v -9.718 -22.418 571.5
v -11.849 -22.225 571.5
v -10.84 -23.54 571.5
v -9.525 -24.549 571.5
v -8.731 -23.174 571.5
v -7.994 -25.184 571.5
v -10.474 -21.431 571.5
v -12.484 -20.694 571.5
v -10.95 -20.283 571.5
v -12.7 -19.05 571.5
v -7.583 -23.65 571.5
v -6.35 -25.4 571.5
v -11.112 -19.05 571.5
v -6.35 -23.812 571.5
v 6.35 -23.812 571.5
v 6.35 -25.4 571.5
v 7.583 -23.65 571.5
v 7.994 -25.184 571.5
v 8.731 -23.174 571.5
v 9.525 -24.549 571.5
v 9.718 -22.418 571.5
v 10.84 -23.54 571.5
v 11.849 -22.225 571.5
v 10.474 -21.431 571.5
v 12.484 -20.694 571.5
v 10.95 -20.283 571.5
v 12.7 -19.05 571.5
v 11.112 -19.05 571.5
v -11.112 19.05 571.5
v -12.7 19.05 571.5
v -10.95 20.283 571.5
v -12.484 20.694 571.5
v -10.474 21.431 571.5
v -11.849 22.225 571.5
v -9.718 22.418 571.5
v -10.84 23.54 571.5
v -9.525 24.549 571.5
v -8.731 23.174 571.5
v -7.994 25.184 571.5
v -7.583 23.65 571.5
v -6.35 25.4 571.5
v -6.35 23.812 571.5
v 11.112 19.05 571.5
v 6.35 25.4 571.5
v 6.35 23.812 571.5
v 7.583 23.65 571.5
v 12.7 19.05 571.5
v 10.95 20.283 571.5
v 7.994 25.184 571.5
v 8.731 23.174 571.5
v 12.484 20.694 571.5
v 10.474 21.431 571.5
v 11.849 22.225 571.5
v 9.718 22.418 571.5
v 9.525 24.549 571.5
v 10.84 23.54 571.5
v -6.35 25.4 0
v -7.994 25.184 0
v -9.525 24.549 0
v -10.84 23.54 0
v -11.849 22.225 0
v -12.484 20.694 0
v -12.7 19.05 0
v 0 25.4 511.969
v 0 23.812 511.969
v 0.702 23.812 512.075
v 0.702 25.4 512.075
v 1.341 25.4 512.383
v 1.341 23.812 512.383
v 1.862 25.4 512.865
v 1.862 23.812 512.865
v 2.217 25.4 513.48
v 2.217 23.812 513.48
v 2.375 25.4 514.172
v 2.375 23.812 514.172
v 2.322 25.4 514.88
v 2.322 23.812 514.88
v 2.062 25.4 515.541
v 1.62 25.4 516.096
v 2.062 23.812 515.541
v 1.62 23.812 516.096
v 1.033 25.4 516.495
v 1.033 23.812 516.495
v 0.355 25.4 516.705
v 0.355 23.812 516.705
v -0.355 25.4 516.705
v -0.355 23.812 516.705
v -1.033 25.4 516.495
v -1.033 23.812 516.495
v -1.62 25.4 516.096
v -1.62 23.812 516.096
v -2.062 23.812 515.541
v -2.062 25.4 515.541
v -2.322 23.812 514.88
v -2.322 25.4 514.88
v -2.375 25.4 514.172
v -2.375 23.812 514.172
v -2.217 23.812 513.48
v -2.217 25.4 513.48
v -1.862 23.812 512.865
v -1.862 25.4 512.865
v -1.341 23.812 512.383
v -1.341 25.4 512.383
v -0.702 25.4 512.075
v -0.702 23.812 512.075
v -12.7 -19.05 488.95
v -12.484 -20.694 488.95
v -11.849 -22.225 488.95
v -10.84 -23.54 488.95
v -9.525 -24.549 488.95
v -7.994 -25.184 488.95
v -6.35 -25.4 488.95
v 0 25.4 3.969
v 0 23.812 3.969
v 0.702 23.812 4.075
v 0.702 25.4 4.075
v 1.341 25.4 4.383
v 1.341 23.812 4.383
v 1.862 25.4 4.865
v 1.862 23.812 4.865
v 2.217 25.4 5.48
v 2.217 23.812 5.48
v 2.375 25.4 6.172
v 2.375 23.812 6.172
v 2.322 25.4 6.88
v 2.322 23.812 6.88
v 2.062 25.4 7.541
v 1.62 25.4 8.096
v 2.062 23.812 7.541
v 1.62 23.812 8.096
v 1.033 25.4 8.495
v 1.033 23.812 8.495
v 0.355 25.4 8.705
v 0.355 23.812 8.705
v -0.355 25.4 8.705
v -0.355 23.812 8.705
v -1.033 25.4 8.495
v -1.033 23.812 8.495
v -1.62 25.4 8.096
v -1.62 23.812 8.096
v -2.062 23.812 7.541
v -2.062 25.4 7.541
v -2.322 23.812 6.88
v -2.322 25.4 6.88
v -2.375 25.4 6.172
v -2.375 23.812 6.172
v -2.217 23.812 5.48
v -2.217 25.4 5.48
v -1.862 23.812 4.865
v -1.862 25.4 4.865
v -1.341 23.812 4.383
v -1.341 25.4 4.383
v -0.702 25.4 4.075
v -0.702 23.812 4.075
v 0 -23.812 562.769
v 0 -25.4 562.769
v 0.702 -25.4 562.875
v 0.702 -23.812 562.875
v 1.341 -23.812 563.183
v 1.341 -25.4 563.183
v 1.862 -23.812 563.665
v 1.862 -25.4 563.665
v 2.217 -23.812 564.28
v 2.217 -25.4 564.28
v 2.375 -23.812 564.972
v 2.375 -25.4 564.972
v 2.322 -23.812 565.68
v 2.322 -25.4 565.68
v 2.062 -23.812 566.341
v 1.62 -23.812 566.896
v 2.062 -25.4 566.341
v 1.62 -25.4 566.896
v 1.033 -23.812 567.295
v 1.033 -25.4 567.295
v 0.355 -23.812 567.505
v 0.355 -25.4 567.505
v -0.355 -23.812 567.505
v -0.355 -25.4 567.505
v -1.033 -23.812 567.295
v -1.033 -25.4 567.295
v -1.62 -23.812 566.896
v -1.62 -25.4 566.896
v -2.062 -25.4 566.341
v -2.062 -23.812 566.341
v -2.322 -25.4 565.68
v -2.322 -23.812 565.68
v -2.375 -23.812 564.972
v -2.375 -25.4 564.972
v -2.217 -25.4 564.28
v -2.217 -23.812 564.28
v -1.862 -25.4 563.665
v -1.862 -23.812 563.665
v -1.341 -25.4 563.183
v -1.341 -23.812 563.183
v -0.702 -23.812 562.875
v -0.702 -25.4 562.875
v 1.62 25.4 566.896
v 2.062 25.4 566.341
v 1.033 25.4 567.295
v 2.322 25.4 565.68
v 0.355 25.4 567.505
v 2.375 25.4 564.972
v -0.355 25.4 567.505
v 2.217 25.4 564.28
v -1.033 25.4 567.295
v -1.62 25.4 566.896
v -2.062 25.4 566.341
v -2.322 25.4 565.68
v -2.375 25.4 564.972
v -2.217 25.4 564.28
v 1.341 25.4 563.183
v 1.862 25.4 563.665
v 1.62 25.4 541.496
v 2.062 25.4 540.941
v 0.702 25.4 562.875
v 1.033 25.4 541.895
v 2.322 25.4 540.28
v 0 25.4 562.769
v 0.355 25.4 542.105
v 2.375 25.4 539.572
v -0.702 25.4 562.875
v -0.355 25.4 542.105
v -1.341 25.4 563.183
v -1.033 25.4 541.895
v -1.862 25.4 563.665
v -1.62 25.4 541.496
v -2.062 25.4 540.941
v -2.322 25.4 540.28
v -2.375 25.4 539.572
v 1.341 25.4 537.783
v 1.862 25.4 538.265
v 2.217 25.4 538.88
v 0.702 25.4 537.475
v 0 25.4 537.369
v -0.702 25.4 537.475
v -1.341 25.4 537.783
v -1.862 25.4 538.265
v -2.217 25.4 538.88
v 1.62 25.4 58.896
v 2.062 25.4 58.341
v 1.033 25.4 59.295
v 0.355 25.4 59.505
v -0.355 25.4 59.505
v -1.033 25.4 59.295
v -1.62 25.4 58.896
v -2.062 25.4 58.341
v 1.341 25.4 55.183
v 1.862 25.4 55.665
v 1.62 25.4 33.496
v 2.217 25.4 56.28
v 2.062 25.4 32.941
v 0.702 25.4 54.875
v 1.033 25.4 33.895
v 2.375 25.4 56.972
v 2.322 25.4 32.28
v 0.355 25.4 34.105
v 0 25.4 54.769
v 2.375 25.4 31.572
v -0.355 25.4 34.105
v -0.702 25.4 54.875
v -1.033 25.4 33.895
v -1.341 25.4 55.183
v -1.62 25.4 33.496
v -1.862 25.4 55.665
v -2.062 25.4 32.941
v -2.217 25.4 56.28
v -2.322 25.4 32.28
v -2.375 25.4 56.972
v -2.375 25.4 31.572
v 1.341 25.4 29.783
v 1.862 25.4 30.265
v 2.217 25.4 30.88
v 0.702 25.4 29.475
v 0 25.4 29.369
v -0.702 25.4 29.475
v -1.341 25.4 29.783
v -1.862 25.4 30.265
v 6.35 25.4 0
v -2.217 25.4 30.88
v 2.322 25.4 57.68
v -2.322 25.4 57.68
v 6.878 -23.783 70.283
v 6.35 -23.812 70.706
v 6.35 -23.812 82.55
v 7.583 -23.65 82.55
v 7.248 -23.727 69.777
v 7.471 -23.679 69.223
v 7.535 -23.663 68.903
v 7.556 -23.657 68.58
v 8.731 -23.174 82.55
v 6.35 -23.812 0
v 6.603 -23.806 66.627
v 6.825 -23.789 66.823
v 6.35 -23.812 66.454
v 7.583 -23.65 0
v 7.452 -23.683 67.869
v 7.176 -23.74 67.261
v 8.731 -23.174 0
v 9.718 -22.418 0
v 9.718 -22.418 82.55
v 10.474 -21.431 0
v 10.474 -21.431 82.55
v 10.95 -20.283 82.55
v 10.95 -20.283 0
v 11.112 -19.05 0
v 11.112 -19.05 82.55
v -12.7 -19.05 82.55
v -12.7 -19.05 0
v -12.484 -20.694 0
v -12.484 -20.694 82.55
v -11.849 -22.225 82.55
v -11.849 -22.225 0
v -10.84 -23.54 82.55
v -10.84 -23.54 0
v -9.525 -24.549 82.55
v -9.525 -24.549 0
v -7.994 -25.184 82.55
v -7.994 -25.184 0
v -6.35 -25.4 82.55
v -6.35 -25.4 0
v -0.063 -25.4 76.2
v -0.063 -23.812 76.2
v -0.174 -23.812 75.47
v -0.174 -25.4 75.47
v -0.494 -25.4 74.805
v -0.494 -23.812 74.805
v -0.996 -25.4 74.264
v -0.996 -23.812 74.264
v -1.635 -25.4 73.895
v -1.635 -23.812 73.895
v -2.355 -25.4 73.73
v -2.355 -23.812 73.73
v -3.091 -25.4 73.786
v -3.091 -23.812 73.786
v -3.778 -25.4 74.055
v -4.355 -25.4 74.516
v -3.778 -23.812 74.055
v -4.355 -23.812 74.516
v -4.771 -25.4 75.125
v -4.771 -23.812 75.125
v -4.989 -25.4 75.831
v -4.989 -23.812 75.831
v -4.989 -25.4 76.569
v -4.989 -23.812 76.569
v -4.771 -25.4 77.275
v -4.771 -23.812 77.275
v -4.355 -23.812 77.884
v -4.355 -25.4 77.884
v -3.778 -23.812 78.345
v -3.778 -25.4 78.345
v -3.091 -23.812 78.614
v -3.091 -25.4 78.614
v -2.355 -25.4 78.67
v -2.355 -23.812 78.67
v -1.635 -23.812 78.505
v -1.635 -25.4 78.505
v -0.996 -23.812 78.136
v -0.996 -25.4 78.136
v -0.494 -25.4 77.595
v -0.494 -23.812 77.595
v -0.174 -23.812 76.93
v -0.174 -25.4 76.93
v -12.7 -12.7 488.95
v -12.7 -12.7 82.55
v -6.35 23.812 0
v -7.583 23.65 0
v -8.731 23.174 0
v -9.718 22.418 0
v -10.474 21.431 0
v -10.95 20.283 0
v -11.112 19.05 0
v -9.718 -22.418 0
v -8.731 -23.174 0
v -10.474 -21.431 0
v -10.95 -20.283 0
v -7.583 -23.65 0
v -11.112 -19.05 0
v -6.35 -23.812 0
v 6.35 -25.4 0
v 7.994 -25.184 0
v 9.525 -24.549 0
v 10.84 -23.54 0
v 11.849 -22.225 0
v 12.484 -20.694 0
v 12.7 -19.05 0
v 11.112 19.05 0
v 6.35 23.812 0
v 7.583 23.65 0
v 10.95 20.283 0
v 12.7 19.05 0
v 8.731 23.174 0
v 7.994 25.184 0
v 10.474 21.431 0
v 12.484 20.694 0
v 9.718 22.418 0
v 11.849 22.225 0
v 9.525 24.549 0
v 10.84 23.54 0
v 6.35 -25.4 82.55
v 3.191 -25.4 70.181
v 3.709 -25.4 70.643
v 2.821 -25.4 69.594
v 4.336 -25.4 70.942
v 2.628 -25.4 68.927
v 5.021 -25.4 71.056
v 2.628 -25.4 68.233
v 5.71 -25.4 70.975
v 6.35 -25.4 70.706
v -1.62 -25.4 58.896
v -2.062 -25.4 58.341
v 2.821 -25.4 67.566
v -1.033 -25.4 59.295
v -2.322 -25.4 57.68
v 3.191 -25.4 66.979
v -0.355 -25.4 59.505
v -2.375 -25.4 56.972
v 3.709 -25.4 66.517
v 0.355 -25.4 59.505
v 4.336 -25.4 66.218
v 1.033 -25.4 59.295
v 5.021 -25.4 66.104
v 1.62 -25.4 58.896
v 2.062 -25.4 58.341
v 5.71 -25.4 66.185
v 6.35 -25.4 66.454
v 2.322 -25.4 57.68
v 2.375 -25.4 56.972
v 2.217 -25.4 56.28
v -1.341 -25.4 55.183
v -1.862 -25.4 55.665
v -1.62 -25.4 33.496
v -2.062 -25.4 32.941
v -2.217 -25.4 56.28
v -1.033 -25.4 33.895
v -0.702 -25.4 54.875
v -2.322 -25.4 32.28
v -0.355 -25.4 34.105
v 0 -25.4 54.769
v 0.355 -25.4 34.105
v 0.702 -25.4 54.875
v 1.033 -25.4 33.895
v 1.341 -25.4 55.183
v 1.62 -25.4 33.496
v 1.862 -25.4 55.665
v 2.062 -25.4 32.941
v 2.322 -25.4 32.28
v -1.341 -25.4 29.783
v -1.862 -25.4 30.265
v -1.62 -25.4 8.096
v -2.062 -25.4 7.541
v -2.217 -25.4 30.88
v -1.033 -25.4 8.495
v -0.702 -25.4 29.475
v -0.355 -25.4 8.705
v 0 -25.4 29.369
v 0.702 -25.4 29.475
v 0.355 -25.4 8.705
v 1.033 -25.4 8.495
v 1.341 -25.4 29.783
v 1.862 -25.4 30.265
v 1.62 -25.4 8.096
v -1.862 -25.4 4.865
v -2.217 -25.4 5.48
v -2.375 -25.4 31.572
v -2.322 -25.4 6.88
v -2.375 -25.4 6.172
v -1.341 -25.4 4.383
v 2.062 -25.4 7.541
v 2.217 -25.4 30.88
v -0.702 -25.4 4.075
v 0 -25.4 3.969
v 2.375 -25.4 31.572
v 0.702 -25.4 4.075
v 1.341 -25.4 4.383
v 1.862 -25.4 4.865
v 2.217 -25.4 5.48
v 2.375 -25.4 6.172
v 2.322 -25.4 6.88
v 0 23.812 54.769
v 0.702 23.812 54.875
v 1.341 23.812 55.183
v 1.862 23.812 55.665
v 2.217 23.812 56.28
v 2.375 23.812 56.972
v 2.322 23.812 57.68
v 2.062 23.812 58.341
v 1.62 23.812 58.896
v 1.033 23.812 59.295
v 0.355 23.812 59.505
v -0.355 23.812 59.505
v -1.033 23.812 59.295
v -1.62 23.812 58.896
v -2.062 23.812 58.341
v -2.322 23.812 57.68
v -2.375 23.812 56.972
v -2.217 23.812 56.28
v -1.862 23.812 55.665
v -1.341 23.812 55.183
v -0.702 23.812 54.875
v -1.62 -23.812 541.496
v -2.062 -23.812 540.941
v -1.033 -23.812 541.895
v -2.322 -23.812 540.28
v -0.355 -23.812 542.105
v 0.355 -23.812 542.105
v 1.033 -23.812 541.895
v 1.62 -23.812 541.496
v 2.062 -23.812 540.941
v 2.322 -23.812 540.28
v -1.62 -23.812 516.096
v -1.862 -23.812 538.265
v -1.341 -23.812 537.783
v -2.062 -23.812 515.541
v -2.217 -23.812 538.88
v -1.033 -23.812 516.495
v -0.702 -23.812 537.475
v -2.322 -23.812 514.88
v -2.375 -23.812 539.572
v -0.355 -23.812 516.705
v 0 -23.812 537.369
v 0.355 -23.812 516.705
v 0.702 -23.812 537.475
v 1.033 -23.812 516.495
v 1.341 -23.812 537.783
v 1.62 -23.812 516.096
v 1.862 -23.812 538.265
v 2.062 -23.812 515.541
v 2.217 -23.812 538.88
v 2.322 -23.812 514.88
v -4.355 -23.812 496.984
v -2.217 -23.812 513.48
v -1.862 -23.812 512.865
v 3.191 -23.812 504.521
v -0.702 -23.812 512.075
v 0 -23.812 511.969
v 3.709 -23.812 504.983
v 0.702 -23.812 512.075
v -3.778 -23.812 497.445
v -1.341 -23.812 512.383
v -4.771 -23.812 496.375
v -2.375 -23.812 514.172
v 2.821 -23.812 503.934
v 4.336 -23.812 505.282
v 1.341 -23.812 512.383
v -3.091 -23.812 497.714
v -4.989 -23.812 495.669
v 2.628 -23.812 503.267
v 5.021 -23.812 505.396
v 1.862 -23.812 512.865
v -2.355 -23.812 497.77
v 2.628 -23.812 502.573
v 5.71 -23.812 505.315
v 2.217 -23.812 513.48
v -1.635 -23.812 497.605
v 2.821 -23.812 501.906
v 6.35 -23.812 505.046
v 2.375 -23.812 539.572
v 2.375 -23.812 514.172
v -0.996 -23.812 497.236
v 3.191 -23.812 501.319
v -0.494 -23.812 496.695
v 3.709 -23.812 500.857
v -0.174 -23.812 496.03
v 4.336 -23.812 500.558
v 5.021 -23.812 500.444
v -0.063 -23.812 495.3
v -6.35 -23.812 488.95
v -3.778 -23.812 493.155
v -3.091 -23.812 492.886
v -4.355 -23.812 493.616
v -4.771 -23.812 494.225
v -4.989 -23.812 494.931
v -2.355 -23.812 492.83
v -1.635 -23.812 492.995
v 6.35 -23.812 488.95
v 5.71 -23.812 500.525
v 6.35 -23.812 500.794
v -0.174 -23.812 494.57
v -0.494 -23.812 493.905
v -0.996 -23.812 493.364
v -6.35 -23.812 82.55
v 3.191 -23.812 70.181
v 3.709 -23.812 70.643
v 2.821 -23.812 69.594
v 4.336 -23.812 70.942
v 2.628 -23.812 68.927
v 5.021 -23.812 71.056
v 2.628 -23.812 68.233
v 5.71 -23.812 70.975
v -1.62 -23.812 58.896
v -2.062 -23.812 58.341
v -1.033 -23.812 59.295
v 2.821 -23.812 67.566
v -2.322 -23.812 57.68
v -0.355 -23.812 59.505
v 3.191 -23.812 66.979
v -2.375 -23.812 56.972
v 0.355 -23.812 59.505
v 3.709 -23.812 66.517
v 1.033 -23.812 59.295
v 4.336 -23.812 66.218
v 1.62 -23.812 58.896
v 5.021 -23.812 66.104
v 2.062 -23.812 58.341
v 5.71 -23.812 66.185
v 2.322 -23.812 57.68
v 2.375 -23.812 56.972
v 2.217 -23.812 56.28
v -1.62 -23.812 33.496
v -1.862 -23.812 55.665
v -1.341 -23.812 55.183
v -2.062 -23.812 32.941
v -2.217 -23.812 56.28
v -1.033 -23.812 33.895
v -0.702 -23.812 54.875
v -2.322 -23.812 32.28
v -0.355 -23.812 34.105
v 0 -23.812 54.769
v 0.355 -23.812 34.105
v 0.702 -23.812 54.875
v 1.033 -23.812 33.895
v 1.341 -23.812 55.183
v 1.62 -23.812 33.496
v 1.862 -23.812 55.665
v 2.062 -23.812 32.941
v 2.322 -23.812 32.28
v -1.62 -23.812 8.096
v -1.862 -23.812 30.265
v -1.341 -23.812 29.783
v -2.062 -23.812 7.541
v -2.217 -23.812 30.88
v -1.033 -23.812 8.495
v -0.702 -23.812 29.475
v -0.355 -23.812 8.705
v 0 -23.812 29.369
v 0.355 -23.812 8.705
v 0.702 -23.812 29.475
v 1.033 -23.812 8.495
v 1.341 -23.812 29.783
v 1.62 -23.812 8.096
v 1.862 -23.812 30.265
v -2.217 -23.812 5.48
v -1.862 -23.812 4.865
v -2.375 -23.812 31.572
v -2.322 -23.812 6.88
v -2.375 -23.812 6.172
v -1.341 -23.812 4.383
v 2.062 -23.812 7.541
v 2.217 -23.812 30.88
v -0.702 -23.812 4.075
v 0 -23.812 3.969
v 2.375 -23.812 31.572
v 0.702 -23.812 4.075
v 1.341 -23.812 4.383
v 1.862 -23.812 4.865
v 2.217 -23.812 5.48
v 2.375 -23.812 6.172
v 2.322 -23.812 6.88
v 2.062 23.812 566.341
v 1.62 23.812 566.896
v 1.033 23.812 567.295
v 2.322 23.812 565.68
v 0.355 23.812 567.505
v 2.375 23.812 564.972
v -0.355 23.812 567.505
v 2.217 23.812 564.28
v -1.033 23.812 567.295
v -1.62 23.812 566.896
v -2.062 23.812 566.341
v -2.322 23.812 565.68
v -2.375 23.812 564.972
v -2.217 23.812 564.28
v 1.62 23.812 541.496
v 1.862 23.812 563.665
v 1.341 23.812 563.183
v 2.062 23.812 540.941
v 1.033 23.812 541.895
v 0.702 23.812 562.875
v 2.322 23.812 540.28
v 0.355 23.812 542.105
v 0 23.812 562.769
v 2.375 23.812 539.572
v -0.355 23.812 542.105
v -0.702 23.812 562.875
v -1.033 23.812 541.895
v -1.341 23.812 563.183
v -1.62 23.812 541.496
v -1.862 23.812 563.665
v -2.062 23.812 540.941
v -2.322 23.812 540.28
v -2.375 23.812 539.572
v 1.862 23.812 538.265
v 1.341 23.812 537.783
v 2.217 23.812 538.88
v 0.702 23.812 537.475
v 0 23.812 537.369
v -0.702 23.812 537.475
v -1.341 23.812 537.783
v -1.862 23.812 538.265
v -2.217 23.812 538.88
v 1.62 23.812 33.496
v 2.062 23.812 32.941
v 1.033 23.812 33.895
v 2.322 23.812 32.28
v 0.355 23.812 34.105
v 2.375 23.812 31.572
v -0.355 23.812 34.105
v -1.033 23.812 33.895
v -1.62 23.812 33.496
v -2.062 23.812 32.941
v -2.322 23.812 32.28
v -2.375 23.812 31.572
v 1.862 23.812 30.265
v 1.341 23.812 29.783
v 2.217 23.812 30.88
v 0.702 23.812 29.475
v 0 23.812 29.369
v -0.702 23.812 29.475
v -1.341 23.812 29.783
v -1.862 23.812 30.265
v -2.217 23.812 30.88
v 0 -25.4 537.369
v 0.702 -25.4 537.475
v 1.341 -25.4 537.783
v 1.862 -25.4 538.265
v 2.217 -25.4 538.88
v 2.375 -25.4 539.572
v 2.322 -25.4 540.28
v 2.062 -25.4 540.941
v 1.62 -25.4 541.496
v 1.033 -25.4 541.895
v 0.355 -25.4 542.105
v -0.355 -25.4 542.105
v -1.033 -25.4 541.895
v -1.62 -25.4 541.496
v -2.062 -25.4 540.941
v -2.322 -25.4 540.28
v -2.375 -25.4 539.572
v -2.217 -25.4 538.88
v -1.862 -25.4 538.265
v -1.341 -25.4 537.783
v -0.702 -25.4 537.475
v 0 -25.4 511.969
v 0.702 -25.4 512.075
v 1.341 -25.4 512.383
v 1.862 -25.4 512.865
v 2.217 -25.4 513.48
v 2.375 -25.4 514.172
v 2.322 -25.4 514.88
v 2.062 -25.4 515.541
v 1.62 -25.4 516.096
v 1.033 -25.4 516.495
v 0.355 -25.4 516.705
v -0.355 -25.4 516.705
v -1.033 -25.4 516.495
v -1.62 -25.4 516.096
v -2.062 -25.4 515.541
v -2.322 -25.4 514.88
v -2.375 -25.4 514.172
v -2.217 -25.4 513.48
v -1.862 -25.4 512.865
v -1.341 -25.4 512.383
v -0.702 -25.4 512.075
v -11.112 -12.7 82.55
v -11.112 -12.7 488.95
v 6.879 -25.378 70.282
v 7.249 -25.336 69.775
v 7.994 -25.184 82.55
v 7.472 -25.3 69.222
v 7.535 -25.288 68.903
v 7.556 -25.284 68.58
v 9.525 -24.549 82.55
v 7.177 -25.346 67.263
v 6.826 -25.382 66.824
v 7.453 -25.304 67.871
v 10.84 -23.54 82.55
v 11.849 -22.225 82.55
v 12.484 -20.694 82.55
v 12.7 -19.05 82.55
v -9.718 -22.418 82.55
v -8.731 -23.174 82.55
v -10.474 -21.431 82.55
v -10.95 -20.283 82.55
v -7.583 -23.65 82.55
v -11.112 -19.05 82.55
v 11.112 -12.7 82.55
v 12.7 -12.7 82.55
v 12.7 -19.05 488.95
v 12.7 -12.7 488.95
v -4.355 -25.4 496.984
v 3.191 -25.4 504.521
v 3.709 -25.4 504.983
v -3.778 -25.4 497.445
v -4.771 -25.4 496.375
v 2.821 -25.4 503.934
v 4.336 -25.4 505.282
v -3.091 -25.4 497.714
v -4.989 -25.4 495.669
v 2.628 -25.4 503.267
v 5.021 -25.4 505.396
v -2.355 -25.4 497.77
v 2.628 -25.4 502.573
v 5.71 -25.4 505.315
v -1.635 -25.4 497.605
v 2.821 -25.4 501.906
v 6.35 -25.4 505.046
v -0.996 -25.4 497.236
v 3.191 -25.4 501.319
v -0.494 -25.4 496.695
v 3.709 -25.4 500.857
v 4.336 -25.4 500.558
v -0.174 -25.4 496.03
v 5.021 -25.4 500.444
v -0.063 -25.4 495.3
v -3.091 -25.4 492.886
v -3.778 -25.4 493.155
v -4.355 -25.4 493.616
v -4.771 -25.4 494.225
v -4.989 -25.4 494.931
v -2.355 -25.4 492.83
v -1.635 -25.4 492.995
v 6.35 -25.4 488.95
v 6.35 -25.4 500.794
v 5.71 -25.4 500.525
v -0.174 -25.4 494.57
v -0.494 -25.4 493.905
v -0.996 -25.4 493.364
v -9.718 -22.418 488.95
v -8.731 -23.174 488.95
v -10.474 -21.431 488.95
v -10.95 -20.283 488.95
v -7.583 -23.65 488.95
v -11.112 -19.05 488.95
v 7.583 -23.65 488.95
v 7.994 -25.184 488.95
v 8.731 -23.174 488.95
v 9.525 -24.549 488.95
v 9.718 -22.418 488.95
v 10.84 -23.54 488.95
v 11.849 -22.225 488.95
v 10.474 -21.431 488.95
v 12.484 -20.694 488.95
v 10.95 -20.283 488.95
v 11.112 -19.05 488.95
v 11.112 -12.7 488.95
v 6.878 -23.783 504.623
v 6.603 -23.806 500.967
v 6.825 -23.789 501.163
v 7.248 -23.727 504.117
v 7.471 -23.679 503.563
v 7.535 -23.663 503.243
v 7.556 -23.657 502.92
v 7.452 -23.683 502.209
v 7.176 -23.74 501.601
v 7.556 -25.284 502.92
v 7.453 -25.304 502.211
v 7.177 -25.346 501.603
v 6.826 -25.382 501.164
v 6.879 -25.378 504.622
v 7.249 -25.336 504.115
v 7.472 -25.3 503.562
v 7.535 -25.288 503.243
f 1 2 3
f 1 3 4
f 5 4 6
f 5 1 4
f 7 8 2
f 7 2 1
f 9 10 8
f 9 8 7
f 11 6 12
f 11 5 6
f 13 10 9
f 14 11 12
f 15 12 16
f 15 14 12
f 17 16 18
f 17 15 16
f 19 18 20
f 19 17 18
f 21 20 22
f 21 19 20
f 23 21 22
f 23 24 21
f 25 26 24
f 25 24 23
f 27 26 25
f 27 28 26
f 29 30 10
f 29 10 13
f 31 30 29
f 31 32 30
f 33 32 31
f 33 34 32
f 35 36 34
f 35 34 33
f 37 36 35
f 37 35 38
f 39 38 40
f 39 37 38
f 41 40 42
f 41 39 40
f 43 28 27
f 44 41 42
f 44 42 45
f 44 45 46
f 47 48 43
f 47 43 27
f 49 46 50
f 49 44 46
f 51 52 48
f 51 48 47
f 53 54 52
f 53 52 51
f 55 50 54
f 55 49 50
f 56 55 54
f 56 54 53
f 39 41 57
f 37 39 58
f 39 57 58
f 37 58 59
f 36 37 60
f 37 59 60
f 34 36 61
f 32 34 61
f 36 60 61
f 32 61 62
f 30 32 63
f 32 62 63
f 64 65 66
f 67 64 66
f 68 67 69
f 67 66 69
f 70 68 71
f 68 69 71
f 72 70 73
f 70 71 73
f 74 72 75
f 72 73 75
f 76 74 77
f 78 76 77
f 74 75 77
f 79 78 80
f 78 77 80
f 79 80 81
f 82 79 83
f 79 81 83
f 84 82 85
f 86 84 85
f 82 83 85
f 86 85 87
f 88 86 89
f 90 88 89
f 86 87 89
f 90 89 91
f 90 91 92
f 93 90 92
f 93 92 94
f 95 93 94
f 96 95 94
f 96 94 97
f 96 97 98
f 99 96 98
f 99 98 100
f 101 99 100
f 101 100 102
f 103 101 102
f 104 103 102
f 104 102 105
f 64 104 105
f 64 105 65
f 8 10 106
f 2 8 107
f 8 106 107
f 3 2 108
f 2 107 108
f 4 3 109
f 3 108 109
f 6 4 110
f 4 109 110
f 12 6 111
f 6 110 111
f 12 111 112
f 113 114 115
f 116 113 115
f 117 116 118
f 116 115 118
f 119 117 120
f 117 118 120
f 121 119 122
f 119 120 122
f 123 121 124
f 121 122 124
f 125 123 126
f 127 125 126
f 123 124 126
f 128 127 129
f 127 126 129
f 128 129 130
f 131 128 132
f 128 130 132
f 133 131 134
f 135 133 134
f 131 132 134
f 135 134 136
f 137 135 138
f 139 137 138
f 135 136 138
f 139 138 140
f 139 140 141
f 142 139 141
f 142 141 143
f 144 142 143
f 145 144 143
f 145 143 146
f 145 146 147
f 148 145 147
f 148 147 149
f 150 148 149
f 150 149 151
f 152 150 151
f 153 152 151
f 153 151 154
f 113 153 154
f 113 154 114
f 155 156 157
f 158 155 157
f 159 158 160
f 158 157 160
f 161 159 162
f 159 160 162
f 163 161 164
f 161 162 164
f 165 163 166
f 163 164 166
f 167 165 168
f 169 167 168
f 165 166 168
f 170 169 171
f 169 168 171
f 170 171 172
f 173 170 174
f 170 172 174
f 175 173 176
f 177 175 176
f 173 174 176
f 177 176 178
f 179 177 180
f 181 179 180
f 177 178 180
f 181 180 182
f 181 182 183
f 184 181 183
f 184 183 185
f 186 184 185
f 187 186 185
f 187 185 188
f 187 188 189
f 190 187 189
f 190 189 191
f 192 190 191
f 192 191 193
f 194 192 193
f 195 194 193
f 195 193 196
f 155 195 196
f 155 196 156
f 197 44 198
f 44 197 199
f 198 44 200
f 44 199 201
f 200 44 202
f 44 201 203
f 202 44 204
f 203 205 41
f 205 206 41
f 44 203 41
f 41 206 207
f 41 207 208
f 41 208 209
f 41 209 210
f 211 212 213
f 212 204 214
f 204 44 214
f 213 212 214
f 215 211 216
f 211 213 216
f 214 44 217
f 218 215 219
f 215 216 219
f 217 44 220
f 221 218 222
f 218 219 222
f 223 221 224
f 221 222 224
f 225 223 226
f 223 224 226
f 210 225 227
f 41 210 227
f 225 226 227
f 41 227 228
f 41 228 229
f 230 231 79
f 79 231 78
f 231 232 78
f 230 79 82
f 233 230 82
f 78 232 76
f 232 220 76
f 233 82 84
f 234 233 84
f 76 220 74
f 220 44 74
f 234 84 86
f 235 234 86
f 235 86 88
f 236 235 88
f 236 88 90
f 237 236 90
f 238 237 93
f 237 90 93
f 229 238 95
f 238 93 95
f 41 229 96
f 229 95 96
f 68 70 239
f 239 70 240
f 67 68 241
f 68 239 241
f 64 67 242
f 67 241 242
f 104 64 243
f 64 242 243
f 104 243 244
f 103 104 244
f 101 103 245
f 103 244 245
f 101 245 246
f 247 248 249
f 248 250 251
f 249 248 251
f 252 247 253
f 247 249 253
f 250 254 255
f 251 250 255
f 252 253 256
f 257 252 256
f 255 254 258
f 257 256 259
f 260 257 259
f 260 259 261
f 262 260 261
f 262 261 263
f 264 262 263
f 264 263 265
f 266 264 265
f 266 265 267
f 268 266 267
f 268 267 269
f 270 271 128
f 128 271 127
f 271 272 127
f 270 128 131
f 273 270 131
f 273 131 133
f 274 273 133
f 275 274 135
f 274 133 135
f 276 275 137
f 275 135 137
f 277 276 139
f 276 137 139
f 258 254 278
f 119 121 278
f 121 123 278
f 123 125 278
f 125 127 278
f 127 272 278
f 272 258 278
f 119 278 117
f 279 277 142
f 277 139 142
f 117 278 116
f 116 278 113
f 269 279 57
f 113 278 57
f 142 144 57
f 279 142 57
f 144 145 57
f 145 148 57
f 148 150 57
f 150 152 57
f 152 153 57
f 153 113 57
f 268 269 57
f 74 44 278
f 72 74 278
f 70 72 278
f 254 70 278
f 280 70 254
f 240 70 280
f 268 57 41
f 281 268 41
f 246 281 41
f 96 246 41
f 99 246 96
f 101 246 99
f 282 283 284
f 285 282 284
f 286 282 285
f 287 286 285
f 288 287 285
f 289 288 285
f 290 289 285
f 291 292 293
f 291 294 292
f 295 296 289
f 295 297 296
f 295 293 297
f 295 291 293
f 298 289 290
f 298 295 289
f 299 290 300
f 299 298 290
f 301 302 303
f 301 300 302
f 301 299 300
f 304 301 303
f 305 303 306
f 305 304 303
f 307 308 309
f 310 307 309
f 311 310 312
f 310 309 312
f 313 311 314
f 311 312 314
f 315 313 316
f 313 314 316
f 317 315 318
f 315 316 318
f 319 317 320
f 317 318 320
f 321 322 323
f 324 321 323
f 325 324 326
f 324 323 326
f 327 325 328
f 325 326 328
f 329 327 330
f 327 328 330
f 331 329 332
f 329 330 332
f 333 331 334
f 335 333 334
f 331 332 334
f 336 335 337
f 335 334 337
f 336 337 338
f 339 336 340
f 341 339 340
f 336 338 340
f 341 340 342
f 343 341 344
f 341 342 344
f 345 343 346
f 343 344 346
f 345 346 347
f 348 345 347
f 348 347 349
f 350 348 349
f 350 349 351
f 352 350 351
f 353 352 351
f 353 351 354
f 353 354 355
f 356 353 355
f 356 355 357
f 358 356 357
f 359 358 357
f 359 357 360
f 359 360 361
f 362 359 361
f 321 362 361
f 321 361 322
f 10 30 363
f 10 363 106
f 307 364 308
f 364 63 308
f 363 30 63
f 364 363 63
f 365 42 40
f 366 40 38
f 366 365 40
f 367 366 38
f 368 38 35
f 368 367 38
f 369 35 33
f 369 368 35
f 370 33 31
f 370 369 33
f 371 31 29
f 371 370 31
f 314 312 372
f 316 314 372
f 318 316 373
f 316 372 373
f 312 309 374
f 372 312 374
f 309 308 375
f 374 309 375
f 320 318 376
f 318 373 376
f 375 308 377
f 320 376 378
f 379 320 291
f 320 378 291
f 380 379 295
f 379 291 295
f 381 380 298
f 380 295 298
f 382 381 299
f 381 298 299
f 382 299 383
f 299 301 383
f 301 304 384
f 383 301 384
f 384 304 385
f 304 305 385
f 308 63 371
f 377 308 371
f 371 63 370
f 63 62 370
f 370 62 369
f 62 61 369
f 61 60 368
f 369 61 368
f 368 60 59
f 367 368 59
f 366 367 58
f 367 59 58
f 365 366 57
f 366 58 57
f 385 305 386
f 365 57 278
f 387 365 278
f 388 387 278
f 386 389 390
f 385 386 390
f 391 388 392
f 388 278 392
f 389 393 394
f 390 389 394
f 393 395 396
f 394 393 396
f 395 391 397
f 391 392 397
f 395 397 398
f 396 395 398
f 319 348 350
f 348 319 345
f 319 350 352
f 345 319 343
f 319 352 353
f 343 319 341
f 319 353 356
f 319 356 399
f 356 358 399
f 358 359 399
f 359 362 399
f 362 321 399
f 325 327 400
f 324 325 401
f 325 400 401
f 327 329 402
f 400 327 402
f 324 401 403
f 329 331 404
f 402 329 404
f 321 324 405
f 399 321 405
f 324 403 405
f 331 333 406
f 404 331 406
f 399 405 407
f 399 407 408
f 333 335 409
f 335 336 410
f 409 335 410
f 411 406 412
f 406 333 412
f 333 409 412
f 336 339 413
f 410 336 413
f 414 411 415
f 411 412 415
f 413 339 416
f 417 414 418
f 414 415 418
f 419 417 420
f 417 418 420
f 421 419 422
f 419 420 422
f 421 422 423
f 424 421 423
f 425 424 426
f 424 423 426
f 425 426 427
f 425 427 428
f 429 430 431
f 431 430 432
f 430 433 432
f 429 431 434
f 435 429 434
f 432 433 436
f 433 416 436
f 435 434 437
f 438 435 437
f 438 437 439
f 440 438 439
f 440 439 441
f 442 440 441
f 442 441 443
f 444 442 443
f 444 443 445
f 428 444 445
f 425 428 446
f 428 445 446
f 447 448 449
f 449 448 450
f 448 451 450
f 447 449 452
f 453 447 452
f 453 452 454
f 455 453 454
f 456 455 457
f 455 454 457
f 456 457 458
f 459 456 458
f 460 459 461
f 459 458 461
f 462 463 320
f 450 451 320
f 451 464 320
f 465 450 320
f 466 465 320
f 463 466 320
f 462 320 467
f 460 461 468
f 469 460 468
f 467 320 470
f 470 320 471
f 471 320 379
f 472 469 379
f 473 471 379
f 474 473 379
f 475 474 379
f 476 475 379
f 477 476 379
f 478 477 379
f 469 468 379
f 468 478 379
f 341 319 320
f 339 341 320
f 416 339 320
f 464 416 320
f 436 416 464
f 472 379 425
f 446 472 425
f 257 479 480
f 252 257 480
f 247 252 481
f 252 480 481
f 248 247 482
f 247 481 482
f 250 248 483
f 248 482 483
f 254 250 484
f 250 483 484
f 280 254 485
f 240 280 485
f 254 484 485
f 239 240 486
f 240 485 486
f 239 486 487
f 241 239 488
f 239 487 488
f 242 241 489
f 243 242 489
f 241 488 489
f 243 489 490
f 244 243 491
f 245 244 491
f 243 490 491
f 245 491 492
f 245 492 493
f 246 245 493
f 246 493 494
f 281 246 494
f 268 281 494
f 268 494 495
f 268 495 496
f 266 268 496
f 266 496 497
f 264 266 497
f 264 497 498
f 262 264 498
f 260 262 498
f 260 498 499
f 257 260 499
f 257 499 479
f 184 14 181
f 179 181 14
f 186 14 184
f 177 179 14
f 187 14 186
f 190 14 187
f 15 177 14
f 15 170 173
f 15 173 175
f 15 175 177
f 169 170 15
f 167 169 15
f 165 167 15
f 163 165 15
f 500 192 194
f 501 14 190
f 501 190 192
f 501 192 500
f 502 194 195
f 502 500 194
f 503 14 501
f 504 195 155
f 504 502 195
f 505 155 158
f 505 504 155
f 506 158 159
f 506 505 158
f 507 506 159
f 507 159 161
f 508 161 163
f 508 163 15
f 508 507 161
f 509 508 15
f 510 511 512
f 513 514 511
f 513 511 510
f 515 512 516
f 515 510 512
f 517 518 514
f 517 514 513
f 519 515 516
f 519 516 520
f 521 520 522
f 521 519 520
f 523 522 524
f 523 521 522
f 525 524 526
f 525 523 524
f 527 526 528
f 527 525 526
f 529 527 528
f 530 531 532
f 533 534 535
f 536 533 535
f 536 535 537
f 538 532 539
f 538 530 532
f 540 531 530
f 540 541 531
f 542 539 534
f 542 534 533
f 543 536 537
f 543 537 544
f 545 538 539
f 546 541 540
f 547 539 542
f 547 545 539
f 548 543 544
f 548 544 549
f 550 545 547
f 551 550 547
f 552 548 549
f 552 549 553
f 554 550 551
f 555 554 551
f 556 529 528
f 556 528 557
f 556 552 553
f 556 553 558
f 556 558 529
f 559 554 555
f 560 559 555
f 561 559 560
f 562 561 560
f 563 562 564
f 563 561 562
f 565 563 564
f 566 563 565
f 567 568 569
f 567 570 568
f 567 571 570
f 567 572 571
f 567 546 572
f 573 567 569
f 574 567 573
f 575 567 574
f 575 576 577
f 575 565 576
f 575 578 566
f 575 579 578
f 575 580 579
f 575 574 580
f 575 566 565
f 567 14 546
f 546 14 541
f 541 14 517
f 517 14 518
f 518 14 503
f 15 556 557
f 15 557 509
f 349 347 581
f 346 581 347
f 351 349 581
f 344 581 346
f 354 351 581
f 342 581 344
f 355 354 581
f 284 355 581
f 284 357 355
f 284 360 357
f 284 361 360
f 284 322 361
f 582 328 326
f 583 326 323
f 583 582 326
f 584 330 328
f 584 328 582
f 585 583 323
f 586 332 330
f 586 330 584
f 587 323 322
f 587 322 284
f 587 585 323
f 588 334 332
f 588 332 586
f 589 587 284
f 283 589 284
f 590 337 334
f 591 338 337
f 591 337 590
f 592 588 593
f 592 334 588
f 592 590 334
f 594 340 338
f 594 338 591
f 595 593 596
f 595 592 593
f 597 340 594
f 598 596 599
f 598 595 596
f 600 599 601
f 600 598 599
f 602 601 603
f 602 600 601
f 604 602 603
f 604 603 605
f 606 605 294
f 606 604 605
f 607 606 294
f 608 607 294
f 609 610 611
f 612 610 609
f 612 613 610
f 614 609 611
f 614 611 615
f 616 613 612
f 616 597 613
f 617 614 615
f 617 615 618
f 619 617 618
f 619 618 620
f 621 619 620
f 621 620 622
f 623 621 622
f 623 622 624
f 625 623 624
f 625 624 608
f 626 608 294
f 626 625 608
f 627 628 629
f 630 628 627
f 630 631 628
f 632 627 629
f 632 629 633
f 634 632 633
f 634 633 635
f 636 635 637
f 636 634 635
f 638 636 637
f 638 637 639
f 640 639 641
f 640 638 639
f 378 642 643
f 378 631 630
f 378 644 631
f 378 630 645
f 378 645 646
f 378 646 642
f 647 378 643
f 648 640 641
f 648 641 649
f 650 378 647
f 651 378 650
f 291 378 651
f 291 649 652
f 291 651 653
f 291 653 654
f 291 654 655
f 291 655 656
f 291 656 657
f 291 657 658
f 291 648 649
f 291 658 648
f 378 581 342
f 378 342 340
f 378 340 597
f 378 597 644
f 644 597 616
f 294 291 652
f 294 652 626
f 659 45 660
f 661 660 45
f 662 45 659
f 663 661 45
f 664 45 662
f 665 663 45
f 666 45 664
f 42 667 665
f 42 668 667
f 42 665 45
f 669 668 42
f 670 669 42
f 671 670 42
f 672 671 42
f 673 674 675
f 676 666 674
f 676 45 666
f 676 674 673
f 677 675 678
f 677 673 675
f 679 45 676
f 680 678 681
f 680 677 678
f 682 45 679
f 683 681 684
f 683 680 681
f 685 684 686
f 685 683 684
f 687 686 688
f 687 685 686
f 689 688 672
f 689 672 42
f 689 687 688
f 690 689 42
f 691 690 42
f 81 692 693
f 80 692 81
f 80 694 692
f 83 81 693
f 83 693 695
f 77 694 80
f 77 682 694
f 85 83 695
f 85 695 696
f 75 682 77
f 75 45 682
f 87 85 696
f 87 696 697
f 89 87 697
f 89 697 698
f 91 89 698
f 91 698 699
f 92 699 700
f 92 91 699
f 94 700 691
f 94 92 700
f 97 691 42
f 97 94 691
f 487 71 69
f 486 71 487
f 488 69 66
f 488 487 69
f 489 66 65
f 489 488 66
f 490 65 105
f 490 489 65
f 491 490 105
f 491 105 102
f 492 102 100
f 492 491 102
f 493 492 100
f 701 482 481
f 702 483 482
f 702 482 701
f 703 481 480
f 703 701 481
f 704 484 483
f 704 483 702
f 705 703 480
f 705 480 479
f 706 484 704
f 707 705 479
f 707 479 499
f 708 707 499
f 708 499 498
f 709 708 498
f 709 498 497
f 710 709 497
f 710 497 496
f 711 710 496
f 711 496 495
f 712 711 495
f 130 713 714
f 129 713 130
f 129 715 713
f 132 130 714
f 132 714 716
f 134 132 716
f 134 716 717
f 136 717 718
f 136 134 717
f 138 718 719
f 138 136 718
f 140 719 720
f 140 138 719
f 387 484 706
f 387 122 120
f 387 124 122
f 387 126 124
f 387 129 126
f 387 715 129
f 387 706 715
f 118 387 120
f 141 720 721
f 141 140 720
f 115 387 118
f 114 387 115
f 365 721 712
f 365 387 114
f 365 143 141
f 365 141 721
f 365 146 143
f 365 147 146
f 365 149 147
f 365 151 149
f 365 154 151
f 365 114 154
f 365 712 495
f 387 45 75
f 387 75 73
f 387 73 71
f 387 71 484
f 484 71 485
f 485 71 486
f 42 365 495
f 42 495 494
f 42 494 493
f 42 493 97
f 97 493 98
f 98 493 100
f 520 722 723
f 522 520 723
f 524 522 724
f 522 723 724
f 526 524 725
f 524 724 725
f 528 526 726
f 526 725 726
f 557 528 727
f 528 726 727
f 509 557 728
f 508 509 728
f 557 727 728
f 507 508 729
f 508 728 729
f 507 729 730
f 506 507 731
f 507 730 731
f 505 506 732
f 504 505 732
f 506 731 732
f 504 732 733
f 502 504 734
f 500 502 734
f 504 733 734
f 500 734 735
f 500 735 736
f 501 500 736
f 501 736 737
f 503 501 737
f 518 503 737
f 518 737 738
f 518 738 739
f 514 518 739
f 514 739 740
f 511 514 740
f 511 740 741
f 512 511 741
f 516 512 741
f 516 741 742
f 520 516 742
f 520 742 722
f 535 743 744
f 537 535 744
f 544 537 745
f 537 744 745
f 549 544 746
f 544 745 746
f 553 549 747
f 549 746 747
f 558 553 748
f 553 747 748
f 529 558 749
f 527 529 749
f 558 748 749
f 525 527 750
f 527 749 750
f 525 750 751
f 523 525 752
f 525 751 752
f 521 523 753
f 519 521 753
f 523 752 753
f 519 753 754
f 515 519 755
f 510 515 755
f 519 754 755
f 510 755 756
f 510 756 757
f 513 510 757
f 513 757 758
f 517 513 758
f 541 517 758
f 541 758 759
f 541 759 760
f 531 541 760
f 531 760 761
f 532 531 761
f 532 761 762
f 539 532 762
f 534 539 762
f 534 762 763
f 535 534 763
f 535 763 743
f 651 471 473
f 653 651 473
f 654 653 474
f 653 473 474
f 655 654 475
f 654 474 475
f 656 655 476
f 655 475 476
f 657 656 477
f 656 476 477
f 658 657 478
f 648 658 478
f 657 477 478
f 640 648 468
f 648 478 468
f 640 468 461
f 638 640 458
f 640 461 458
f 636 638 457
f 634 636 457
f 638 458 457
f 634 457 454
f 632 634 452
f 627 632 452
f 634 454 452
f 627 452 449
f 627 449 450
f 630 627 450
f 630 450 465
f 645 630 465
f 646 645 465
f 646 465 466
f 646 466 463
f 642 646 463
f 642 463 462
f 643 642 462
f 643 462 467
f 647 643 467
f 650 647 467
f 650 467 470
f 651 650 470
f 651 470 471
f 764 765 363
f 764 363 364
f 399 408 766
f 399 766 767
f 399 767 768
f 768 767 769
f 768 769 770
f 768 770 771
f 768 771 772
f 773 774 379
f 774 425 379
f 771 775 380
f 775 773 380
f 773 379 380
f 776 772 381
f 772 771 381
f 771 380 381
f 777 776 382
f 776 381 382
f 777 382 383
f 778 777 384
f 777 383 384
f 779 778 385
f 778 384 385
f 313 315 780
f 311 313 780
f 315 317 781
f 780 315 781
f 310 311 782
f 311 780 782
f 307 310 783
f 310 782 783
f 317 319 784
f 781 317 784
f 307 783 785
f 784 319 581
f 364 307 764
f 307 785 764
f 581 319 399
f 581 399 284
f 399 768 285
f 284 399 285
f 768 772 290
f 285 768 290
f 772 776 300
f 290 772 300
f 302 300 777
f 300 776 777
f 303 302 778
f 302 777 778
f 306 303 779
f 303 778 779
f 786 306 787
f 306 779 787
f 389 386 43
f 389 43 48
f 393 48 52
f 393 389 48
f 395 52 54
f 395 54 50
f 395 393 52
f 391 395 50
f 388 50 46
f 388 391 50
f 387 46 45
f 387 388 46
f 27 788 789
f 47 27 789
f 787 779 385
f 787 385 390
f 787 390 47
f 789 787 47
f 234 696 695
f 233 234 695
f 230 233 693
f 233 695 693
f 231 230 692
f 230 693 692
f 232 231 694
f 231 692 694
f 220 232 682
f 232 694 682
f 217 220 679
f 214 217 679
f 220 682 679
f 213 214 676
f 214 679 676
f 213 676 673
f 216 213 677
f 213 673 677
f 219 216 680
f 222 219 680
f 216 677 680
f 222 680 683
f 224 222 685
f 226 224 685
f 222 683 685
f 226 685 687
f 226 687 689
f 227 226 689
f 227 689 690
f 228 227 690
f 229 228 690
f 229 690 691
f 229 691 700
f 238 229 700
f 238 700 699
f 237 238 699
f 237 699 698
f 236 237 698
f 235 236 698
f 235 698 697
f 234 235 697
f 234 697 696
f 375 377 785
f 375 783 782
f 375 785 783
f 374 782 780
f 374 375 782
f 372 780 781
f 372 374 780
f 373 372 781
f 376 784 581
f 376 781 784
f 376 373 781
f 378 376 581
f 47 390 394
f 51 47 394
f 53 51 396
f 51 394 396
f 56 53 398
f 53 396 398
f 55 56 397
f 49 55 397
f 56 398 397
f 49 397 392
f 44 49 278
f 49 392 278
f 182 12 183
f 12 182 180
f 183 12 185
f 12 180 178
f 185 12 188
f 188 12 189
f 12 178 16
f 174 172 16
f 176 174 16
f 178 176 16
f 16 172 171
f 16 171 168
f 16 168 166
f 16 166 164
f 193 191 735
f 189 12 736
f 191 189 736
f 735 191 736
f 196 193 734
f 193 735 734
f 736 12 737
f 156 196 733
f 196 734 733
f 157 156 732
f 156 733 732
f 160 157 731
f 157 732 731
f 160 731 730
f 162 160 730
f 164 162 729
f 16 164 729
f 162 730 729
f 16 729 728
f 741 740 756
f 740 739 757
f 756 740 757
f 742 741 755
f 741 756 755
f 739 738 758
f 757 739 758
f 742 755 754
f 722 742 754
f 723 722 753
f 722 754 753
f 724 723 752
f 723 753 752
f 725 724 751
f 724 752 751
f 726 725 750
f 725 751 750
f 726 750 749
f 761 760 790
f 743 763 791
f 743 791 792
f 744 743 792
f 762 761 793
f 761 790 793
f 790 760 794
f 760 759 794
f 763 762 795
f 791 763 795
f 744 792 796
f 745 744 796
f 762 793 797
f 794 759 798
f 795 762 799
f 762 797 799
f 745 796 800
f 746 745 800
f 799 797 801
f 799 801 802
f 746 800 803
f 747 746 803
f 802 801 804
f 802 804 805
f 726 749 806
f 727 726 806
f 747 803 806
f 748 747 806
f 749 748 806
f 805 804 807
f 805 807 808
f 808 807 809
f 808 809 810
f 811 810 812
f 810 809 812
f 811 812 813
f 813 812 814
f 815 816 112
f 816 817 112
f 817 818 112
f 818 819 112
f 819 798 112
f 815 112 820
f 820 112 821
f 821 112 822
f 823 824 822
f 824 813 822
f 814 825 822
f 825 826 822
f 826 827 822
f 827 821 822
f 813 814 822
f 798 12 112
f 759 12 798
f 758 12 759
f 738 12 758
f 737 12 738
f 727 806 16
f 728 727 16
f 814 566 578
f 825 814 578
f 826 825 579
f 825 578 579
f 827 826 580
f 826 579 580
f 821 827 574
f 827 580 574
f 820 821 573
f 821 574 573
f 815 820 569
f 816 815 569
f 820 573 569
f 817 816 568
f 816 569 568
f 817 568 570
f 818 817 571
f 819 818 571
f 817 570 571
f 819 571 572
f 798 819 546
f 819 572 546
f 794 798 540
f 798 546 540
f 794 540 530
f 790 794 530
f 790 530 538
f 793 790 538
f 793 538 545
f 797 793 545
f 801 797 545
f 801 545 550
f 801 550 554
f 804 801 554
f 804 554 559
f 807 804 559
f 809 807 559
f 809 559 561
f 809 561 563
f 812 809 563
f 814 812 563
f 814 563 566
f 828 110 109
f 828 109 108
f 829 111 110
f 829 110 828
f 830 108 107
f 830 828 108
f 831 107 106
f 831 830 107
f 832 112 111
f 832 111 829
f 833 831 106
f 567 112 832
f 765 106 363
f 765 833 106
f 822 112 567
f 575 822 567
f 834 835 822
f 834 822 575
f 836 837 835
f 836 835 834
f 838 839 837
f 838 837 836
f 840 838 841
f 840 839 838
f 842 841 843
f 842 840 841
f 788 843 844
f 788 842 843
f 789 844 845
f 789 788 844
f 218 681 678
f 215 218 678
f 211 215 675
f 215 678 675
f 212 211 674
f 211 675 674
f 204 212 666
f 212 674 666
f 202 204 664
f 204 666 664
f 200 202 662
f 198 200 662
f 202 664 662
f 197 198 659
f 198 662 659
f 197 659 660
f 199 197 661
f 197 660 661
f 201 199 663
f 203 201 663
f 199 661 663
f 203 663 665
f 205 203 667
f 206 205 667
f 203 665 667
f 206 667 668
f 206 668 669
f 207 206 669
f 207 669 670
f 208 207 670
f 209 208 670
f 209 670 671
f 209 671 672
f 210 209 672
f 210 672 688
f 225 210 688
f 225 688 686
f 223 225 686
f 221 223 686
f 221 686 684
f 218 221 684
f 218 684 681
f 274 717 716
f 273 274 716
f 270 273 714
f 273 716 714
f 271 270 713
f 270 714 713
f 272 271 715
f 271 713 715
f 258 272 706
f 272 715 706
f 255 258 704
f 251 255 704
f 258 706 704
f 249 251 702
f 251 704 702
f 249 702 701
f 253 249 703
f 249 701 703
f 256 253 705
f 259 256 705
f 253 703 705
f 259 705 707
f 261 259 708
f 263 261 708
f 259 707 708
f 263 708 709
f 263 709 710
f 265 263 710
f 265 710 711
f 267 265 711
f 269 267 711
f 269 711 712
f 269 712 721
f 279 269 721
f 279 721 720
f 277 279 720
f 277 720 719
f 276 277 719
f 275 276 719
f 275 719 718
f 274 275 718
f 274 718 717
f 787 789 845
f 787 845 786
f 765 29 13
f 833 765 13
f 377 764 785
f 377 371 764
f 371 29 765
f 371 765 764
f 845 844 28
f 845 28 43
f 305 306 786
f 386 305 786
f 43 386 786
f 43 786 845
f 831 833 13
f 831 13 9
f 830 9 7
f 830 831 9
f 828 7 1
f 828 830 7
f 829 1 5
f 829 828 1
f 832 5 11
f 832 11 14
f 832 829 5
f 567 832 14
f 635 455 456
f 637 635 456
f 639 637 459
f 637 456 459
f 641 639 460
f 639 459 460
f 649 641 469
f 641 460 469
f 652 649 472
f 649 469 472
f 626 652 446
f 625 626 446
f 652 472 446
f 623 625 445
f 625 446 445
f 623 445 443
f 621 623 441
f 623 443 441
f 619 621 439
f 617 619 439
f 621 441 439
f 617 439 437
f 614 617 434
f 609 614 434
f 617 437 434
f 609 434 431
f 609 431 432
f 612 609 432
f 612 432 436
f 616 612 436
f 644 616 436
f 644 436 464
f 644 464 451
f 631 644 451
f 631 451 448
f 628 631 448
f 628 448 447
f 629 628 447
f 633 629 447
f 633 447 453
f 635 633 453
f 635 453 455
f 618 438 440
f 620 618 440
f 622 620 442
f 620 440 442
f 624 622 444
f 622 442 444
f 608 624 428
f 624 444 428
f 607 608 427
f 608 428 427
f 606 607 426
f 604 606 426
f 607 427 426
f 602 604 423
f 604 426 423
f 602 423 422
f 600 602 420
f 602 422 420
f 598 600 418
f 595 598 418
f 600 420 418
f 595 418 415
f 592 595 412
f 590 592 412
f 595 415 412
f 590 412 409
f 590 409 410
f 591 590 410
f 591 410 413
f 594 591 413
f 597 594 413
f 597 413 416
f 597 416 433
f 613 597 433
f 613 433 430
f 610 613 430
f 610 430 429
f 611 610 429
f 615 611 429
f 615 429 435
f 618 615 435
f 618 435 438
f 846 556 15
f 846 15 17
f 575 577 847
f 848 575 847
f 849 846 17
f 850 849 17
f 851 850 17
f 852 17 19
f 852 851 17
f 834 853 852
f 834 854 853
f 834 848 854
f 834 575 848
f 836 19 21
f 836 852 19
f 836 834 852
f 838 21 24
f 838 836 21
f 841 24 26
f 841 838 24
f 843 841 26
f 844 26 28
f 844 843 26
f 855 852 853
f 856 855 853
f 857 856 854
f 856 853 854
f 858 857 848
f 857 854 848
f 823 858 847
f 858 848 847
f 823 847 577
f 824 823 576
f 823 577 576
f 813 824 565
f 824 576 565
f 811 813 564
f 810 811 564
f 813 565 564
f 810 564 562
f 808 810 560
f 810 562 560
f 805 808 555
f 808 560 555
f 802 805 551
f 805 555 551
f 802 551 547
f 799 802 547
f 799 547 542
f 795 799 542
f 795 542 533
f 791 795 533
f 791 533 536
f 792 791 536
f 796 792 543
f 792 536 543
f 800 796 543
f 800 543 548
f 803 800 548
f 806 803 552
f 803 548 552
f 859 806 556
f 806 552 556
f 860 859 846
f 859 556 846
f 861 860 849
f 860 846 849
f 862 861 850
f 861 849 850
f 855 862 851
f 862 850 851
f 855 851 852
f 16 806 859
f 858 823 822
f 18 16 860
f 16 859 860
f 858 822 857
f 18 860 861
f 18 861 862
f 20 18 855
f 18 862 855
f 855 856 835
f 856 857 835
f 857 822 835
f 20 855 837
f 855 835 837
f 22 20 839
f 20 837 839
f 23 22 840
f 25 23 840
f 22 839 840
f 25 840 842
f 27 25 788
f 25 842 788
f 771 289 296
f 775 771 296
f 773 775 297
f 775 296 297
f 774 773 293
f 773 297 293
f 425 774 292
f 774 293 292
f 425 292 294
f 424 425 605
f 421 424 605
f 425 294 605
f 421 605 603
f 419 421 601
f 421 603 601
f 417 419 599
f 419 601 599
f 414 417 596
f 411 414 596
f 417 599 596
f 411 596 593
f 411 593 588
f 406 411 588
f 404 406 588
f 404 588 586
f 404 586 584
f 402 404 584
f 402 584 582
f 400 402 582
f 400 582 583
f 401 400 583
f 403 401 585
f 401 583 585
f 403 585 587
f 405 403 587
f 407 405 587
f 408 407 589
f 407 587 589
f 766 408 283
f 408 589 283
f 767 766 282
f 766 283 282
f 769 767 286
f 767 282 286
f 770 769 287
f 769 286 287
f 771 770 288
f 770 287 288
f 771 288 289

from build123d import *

# Parameters (mm, degrees)
EXTRUDE_THIN1_DEPTH               = 571.5
F_3_16_0_1875_DIAMETER_HOLE1_D    = 4.7625
SKETCH5_W                         = 406.4
SKETCH5_H                         = 12.7
CUT_EXTRUDE1_DEPTH                = 573.627776134
F_3_16_0_195_DIAMETER_HOLE1_D     = 4.953
F_3_16_0_195_DIAMETER_HOLE1_DEPTH = 25.4
F_3_16_0_195_DIAMETER_HOLE1_TIP   = 1.488031323


with BuildPart() as part:
    # Sketch1 → Extrude-Thin1 (new body)
    with BuildSketch(Plane.XY):
        with BuildLine():
            Line((-12.7, 19.05), (-12.7, -19.05))
            ThreePointArc((-12.7, -19.05), (-10.840128061, -23.540128061), (-6.35, -25.4))
            Line((-6.35, -25.4), (6.35, -25.4))
            ThreePointArc((6.35, -25.4), (10.840128061, -23.540128061), (12.7, -19.05))
            Line((12.7, -19.05), (12.7, 19.05))
            ThreePointArc((12.7, 19.05), (10.840128061, 23.540128061), (6.35, 25.4))
            Line((6.35, 25.4), (-6.35, 25.4))
            ThreePointArc((-6.35, 25.4), (-10.840128061, 23.540128061), (-12.7, 19.05))
        make_face()
        with BuildLine():
            Line((-11.1125, 19.05), (-11.1125, -19.05))
            ThreePointArc((-11.1125, -19.05), (-9.717596045, -22.417596045), (-6.35, -23.8125))
            Line((-6.35, -23.8125), (6.35, -23.8125))
            ThreePointArc((6.35, -23.8125), (9.717596045, -22.417596045), (11.1125, -19.05))
            Line((11.1125, -19.05), (11.1125, 19.05))
            ThreePointArc((11.1125, 19.05), (9.717596045, 22.417596045), (6.35, 23.8125))
            Line((6.35, 23.8125), (-6.35, 23.8125))
            ThreePointArc((-6.35, 23.8125), (-9.717596045, 22.417596045), (-11.1125, 19.05))
        make_face(mode=Mode.SUBTRACT)
    extrude(amount=EXTRUDE_THIN1_DEPTH)

    # 3/16 (0.1875) Diameter Hole1 (through all)
    with Locations(Plane(origin=(0, 25.4, 565.15), x_dir=(0, 0, 1), z_dir=(0, 1, 0))):
        with Locations((0, 0), (-558.8, 0), (-533.4, 0), (-508, 0), (-25.4, 0), (-50.8, 0)):
            Hole(F_3_16_0_1875_DIAMETER_HOLE1_D / 2)

    # Sketch5 → Cut-Extrude1 (cut, through all)
    with BuildSketch(Plane(origin=(12.7, 0, 0), x_dir=(0, 0, -1), z_dir=(1, 0, 0))):
        with Locations((-285.75, -19.05)):
            Rectangle(SKETCH5_W, SKETCH5_H)
    extrude(amount=-CUT_EXTRUDE1_DEPTH, mode=Mode.SUBTRACT)

    # 3/16 (0.195) Diameter Hole1
    with Locations(Plane(origin=(0, -25.4, 0), x_dir=(-1, 0, 0), z_dir=(0, -1, 0))):
        with Locations((2.54, -495.3), (-5.08, -502.92), (-5.08, -68.58), (2.54, -76.2)):
            Hole(F_3_16_0_195_DIAMETER_HOLE1_D / 2, depth=F_3_16_0_195_DIAMETER_HOLE1_DEPTH)
            with Locations((0, 0, -(F_3_16_0_195_DIAMETER_HOLE1_DEPTH + F_3_16_0_195_DIAMETER_HOLE1_TIP / 2))):  # 118° drill point
                Cone(0, F_3_16_0_195_DIAMETER_HOLE1_D / 2, F_3_16_0_195_DIAMETER_HOLE1_TIP, mode=Mode.SUBTRACT)


solid = part.part
